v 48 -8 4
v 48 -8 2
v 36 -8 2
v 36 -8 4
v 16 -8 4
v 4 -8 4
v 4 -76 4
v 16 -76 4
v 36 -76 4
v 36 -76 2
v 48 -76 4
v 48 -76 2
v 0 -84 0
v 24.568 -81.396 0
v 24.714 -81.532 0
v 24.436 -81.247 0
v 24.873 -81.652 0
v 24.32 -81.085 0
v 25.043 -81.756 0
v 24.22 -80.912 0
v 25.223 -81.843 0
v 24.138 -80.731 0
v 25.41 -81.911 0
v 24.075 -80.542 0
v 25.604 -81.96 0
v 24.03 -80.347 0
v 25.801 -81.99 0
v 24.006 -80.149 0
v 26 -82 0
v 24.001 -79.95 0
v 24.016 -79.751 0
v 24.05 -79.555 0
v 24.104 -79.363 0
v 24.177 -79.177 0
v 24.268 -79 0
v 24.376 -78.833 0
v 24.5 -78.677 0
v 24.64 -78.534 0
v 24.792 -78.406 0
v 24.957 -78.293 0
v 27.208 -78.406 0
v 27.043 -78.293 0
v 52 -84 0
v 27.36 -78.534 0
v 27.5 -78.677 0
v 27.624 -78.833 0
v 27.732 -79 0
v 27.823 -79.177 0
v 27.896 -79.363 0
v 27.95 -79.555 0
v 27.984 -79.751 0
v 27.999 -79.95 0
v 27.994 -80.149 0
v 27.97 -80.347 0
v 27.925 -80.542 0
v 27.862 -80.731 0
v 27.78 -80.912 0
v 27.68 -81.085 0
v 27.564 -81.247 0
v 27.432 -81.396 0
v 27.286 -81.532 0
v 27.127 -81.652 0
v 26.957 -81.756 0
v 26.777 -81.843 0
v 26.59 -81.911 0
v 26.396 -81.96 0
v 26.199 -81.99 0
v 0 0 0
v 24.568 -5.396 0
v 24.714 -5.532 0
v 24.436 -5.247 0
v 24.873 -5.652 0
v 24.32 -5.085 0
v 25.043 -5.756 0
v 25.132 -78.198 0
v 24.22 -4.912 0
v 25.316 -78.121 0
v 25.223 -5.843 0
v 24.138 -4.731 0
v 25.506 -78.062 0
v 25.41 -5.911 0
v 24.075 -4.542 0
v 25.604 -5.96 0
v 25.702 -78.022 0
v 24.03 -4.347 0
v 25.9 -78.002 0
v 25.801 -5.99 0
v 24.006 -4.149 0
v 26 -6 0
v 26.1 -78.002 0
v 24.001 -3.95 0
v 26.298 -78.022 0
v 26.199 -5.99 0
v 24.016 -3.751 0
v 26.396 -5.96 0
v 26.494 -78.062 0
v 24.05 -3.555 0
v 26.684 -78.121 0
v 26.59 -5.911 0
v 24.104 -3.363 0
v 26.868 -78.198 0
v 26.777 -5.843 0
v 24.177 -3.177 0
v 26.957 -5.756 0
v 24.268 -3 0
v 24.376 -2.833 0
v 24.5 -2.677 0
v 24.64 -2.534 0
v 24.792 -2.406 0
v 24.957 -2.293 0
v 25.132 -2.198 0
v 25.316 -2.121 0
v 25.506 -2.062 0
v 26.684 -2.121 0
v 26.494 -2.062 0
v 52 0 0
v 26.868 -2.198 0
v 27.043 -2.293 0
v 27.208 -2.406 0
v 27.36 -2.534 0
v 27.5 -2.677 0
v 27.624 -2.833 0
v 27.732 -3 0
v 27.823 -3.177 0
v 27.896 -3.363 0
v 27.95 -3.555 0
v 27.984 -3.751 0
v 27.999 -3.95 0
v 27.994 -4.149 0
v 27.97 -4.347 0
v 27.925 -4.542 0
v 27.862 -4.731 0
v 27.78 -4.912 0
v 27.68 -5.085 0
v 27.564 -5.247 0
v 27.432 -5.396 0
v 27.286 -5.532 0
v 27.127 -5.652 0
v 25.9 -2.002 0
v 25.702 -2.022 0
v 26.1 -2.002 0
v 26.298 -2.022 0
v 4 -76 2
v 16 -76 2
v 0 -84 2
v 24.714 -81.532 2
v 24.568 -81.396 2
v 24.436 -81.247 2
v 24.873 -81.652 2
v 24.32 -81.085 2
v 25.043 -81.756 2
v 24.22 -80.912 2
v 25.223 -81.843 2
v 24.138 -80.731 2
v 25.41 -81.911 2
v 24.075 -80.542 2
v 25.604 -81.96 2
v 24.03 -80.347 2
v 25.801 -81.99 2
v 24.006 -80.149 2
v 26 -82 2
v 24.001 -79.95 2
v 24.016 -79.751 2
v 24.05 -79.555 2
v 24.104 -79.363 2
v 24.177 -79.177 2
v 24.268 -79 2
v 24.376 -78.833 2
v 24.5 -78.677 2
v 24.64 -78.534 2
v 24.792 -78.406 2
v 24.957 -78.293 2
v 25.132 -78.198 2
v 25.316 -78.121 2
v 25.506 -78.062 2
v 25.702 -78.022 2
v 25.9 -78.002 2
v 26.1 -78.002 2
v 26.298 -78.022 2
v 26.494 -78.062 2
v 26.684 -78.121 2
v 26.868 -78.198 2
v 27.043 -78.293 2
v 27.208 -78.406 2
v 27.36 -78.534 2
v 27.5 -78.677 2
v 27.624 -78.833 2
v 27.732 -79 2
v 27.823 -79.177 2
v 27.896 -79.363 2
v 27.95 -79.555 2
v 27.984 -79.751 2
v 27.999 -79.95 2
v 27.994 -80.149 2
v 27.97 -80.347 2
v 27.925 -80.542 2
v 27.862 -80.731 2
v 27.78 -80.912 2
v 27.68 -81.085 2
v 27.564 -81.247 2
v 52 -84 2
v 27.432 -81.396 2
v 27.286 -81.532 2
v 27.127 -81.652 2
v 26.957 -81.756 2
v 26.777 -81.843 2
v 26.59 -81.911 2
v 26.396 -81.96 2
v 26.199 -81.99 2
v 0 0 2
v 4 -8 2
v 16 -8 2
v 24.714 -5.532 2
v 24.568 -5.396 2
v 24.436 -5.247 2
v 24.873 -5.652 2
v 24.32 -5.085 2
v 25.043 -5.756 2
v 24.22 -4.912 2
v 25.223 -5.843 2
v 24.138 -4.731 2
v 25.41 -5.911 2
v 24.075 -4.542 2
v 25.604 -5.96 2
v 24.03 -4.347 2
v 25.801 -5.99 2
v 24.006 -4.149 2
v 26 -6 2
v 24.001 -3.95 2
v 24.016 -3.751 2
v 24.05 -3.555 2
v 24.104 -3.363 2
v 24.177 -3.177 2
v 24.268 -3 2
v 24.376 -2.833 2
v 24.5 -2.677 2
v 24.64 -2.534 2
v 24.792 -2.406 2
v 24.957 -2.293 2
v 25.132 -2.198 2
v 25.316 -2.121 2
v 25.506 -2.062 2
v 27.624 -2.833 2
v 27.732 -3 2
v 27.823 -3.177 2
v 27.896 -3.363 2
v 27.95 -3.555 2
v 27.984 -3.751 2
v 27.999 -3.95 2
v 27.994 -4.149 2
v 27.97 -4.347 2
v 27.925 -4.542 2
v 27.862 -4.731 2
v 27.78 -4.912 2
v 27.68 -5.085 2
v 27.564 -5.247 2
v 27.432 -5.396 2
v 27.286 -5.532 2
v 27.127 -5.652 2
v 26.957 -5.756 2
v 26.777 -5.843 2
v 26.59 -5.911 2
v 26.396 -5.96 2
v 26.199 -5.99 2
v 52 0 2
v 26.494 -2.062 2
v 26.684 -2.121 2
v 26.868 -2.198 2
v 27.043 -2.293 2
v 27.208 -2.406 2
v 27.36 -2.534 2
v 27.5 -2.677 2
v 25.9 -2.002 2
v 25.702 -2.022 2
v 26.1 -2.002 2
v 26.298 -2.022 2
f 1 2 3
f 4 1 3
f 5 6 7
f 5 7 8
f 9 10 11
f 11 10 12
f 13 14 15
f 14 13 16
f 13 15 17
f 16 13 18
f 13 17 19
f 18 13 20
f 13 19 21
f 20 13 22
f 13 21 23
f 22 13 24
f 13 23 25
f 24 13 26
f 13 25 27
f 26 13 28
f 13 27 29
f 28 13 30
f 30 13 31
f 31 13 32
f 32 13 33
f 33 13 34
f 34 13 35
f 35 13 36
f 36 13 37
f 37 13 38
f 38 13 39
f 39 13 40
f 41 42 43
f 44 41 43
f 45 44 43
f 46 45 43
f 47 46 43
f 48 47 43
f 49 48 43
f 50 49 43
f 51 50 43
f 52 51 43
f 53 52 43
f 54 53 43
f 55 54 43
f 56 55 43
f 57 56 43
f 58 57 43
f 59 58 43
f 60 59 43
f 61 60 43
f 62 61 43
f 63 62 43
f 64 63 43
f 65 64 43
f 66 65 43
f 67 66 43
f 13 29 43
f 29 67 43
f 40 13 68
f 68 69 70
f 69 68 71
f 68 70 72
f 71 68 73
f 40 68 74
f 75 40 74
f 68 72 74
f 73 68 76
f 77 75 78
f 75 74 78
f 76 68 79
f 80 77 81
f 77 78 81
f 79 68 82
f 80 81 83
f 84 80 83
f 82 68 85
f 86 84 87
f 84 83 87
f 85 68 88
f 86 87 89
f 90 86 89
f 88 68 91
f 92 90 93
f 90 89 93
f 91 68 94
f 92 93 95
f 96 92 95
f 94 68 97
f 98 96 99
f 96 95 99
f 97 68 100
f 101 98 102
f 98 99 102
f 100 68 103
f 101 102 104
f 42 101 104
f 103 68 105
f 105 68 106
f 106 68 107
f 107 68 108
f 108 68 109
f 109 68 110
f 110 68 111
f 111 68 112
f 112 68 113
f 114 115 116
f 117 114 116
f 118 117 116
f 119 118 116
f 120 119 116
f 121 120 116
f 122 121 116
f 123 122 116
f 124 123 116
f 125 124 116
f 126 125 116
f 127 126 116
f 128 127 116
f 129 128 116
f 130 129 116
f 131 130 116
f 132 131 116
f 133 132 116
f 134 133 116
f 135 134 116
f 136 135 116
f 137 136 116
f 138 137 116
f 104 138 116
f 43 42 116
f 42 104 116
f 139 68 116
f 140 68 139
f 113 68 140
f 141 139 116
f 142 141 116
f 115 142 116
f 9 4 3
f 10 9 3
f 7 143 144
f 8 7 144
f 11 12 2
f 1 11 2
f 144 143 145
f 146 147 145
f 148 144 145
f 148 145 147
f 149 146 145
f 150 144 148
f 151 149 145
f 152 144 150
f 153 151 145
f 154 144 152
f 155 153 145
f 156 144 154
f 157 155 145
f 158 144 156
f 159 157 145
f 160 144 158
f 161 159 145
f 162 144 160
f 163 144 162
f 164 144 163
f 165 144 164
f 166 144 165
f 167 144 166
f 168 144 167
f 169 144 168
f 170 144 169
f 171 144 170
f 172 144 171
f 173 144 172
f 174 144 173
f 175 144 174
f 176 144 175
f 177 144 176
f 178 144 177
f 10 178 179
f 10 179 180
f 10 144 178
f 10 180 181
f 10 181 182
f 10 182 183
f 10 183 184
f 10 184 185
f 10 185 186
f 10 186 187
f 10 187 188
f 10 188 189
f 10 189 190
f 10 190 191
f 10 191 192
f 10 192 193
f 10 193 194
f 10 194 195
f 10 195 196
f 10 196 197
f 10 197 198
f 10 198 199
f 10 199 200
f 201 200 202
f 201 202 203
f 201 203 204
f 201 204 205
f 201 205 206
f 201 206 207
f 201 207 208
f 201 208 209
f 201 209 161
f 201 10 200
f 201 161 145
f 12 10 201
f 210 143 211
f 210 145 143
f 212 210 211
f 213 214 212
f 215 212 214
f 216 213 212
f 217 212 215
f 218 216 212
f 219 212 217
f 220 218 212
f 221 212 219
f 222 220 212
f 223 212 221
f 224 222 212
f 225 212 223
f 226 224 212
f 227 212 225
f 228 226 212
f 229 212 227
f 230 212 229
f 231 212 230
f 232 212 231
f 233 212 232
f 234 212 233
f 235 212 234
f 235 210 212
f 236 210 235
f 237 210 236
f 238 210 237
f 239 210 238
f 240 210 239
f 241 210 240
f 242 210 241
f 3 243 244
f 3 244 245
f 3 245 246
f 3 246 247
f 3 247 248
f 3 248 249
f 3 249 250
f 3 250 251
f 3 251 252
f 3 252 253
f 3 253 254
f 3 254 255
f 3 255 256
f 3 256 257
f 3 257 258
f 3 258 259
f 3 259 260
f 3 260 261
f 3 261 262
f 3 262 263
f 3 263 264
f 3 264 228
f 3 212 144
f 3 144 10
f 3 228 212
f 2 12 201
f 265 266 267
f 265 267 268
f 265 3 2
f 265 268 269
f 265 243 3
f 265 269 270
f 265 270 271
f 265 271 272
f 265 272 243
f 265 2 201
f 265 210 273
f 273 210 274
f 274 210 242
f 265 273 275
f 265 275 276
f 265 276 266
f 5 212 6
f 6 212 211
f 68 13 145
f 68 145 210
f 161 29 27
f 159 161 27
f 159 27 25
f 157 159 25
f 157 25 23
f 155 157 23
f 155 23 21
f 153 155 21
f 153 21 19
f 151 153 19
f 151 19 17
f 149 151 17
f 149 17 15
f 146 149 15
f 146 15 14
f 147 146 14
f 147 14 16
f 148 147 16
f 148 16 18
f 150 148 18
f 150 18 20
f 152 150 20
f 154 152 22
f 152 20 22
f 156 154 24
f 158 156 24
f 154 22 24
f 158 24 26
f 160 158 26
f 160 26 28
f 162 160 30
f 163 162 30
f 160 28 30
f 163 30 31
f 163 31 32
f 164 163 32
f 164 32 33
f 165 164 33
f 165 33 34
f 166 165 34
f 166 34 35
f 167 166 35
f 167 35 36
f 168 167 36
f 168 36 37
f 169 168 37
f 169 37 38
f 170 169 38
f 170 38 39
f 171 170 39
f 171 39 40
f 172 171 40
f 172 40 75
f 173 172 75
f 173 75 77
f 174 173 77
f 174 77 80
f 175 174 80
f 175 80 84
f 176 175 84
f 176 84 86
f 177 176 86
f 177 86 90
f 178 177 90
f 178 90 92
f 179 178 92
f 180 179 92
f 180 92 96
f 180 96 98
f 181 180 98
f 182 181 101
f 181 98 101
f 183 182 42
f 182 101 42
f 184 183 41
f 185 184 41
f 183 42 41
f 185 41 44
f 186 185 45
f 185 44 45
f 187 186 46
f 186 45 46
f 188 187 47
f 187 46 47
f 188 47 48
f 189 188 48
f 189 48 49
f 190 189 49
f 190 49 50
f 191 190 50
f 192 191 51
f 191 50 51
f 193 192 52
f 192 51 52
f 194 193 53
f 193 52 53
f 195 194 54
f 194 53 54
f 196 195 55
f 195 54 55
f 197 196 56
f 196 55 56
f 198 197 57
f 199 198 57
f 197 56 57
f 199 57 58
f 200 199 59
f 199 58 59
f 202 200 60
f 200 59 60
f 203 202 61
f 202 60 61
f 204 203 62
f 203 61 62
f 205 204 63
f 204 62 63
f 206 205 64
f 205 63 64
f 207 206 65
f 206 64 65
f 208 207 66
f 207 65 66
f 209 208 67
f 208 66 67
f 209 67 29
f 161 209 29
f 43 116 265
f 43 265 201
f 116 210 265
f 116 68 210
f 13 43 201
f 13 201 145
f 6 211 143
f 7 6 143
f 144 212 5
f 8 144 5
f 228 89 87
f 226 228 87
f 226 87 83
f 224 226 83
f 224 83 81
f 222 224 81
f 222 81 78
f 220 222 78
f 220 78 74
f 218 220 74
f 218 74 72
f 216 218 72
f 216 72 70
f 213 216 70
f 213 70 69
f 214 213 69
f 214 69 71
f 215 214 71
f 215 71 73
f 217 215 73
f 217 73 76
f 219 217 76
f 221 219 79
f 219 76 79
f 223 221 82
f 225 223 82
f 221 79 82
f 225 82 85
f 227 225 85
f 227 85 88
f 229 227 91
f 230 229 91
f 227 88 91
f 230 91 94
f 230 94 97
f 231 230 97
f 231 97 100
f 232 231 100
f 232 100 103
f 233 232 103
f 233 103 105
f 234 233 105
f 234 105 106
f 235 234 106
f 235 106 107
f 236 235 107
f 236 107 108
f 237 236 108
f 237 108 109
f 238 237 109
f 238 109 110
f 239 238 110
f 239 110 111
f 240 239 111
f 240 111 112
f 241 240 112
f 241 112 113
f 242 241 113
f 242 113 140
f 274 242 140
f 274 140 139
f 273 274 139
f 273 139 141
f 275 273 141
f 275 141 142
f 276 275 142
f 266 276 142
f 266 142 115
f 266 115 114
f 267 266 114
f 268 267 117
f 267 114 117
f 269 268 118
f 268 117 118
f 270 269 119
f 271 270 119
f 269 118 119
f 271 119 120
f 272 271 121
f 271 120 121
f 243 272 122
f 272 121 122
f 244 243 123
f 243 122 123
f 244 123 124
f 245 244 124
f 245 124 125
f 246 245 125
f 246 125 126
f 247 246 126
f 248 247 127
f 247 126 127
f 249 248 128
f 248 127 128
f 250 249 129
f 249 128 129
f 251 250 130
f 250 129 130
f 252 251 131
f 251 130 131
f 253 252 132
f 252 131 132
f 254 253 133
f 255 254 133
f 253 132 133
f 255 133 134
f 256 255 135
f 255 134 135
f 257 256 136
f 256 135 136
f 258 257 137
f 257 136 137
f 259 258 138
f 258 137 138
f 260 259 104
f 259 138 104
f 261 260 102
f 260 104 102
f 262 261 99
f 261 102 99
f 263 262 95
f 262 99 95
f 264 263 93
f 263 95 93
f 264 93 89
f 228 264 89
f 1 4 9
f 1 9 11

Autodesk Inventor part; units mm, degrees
ref_plane "YZ Plane" through (0, 0, 0) normal (1, 0, 0) x (0, 1, 0)
ref_plane "XZ Plane" through (0, 0, 0) normal (0, 1, 0) x (-1, 0, 0)
ref_plane "XY Plane" through (0, 0, 0) normal (0, 0, 1) x (1, 0, 0)
sketch "Skizze1" plane through (0, 0, 0) normal (0, 0, 1) x (1, 0, 0)
  line L0 (0, 0) -> (52, 0)
  line L1 (52, 0) -> (52, -84)
  line L2 (52, -84) -> (0, -84)
  line L3 (0, -84) -> (0, 0)
  dimension "d0" = 52
  dimension "d1" = 84
extrude "Extrusion1" add sketch "Skizze1" along normal blind 2
sketch "Skizze2" plane through (0, 0, 2) normal (0, 0, 1) x (1, 0, 0)
  line L0 (48, -8) -> (4, -8)
  line L1 (4, -8) -> (4, -76)
  line L2 (4, -76) -> (48, -76)
  line L3 (48, -76) -> (48, -8)
  line L4 (52, 0) -> (0, 0) projected
  line L5 (52, -84) -> (52, 0) projected
  line L6 (0, -84) -> (52, -84) projected
  point P0 (26, -8)
  point P1 (26, 0)
  dimension "d4" = 4
  dimension "d5" = 8
  dimension "d6" = 8
extrude "Extrusion2" add sketch "Skizze2" along normal blind 2
sketch "Skizze3" plane through (4, -8, 2) normal (0, 1, 0) x (1, 0, 0)
  line L0 (48, 2) -> (-4, 2) projected
  line L1 (-4, 2) -> (-4, 0) projected
  line L2 (48, 0) -> (-4, 0) projected
  line L3 (48, 2) -> (48, 0) projected
  line L4 (44, -2) -> (0, -2) projected
  line L5 (32, 0) -> (12, 0)
  line L6 (12, 0) -> (12, -2)
  line L7 (12, -2) -> (32, -2)
  line L8 (32, -2) -> (32, 0)
  line L9 (44, 0) -> (44, -2) projected
  point P0 (44, -1)
  point P1 (32, -2)
  point P2 (12, 0)
  dimension "d9" = 20
  dimension "d10" = 12
extrude "Extrusion3" cut sketch "Skizze3" against normal through all contours L2 L8 L4 L6
sketch "Skizze4" plane through (0, 0, 2) normal (0, 0, 1) x (1, 0, 0)
  line L0 (52, 0) -> (0, 0) projected
  line L1 (0, -84) -> (52, -84) projected
  point P0 (26, -4)
  point P1 (26, -80)
  point P2 (26, 0)
  dimension "d20" = 4
  dimension "d21" = 4
hole "Bohrung1" at (26, -4, 2) at (26, -80, 2) direction (0, 0, -1) diameter 4 depth 2
equation "\"d6\" = d5"
equation "\"d21\" = d20"
properties part number "1011" material "Aluminum 6061-AHC"
